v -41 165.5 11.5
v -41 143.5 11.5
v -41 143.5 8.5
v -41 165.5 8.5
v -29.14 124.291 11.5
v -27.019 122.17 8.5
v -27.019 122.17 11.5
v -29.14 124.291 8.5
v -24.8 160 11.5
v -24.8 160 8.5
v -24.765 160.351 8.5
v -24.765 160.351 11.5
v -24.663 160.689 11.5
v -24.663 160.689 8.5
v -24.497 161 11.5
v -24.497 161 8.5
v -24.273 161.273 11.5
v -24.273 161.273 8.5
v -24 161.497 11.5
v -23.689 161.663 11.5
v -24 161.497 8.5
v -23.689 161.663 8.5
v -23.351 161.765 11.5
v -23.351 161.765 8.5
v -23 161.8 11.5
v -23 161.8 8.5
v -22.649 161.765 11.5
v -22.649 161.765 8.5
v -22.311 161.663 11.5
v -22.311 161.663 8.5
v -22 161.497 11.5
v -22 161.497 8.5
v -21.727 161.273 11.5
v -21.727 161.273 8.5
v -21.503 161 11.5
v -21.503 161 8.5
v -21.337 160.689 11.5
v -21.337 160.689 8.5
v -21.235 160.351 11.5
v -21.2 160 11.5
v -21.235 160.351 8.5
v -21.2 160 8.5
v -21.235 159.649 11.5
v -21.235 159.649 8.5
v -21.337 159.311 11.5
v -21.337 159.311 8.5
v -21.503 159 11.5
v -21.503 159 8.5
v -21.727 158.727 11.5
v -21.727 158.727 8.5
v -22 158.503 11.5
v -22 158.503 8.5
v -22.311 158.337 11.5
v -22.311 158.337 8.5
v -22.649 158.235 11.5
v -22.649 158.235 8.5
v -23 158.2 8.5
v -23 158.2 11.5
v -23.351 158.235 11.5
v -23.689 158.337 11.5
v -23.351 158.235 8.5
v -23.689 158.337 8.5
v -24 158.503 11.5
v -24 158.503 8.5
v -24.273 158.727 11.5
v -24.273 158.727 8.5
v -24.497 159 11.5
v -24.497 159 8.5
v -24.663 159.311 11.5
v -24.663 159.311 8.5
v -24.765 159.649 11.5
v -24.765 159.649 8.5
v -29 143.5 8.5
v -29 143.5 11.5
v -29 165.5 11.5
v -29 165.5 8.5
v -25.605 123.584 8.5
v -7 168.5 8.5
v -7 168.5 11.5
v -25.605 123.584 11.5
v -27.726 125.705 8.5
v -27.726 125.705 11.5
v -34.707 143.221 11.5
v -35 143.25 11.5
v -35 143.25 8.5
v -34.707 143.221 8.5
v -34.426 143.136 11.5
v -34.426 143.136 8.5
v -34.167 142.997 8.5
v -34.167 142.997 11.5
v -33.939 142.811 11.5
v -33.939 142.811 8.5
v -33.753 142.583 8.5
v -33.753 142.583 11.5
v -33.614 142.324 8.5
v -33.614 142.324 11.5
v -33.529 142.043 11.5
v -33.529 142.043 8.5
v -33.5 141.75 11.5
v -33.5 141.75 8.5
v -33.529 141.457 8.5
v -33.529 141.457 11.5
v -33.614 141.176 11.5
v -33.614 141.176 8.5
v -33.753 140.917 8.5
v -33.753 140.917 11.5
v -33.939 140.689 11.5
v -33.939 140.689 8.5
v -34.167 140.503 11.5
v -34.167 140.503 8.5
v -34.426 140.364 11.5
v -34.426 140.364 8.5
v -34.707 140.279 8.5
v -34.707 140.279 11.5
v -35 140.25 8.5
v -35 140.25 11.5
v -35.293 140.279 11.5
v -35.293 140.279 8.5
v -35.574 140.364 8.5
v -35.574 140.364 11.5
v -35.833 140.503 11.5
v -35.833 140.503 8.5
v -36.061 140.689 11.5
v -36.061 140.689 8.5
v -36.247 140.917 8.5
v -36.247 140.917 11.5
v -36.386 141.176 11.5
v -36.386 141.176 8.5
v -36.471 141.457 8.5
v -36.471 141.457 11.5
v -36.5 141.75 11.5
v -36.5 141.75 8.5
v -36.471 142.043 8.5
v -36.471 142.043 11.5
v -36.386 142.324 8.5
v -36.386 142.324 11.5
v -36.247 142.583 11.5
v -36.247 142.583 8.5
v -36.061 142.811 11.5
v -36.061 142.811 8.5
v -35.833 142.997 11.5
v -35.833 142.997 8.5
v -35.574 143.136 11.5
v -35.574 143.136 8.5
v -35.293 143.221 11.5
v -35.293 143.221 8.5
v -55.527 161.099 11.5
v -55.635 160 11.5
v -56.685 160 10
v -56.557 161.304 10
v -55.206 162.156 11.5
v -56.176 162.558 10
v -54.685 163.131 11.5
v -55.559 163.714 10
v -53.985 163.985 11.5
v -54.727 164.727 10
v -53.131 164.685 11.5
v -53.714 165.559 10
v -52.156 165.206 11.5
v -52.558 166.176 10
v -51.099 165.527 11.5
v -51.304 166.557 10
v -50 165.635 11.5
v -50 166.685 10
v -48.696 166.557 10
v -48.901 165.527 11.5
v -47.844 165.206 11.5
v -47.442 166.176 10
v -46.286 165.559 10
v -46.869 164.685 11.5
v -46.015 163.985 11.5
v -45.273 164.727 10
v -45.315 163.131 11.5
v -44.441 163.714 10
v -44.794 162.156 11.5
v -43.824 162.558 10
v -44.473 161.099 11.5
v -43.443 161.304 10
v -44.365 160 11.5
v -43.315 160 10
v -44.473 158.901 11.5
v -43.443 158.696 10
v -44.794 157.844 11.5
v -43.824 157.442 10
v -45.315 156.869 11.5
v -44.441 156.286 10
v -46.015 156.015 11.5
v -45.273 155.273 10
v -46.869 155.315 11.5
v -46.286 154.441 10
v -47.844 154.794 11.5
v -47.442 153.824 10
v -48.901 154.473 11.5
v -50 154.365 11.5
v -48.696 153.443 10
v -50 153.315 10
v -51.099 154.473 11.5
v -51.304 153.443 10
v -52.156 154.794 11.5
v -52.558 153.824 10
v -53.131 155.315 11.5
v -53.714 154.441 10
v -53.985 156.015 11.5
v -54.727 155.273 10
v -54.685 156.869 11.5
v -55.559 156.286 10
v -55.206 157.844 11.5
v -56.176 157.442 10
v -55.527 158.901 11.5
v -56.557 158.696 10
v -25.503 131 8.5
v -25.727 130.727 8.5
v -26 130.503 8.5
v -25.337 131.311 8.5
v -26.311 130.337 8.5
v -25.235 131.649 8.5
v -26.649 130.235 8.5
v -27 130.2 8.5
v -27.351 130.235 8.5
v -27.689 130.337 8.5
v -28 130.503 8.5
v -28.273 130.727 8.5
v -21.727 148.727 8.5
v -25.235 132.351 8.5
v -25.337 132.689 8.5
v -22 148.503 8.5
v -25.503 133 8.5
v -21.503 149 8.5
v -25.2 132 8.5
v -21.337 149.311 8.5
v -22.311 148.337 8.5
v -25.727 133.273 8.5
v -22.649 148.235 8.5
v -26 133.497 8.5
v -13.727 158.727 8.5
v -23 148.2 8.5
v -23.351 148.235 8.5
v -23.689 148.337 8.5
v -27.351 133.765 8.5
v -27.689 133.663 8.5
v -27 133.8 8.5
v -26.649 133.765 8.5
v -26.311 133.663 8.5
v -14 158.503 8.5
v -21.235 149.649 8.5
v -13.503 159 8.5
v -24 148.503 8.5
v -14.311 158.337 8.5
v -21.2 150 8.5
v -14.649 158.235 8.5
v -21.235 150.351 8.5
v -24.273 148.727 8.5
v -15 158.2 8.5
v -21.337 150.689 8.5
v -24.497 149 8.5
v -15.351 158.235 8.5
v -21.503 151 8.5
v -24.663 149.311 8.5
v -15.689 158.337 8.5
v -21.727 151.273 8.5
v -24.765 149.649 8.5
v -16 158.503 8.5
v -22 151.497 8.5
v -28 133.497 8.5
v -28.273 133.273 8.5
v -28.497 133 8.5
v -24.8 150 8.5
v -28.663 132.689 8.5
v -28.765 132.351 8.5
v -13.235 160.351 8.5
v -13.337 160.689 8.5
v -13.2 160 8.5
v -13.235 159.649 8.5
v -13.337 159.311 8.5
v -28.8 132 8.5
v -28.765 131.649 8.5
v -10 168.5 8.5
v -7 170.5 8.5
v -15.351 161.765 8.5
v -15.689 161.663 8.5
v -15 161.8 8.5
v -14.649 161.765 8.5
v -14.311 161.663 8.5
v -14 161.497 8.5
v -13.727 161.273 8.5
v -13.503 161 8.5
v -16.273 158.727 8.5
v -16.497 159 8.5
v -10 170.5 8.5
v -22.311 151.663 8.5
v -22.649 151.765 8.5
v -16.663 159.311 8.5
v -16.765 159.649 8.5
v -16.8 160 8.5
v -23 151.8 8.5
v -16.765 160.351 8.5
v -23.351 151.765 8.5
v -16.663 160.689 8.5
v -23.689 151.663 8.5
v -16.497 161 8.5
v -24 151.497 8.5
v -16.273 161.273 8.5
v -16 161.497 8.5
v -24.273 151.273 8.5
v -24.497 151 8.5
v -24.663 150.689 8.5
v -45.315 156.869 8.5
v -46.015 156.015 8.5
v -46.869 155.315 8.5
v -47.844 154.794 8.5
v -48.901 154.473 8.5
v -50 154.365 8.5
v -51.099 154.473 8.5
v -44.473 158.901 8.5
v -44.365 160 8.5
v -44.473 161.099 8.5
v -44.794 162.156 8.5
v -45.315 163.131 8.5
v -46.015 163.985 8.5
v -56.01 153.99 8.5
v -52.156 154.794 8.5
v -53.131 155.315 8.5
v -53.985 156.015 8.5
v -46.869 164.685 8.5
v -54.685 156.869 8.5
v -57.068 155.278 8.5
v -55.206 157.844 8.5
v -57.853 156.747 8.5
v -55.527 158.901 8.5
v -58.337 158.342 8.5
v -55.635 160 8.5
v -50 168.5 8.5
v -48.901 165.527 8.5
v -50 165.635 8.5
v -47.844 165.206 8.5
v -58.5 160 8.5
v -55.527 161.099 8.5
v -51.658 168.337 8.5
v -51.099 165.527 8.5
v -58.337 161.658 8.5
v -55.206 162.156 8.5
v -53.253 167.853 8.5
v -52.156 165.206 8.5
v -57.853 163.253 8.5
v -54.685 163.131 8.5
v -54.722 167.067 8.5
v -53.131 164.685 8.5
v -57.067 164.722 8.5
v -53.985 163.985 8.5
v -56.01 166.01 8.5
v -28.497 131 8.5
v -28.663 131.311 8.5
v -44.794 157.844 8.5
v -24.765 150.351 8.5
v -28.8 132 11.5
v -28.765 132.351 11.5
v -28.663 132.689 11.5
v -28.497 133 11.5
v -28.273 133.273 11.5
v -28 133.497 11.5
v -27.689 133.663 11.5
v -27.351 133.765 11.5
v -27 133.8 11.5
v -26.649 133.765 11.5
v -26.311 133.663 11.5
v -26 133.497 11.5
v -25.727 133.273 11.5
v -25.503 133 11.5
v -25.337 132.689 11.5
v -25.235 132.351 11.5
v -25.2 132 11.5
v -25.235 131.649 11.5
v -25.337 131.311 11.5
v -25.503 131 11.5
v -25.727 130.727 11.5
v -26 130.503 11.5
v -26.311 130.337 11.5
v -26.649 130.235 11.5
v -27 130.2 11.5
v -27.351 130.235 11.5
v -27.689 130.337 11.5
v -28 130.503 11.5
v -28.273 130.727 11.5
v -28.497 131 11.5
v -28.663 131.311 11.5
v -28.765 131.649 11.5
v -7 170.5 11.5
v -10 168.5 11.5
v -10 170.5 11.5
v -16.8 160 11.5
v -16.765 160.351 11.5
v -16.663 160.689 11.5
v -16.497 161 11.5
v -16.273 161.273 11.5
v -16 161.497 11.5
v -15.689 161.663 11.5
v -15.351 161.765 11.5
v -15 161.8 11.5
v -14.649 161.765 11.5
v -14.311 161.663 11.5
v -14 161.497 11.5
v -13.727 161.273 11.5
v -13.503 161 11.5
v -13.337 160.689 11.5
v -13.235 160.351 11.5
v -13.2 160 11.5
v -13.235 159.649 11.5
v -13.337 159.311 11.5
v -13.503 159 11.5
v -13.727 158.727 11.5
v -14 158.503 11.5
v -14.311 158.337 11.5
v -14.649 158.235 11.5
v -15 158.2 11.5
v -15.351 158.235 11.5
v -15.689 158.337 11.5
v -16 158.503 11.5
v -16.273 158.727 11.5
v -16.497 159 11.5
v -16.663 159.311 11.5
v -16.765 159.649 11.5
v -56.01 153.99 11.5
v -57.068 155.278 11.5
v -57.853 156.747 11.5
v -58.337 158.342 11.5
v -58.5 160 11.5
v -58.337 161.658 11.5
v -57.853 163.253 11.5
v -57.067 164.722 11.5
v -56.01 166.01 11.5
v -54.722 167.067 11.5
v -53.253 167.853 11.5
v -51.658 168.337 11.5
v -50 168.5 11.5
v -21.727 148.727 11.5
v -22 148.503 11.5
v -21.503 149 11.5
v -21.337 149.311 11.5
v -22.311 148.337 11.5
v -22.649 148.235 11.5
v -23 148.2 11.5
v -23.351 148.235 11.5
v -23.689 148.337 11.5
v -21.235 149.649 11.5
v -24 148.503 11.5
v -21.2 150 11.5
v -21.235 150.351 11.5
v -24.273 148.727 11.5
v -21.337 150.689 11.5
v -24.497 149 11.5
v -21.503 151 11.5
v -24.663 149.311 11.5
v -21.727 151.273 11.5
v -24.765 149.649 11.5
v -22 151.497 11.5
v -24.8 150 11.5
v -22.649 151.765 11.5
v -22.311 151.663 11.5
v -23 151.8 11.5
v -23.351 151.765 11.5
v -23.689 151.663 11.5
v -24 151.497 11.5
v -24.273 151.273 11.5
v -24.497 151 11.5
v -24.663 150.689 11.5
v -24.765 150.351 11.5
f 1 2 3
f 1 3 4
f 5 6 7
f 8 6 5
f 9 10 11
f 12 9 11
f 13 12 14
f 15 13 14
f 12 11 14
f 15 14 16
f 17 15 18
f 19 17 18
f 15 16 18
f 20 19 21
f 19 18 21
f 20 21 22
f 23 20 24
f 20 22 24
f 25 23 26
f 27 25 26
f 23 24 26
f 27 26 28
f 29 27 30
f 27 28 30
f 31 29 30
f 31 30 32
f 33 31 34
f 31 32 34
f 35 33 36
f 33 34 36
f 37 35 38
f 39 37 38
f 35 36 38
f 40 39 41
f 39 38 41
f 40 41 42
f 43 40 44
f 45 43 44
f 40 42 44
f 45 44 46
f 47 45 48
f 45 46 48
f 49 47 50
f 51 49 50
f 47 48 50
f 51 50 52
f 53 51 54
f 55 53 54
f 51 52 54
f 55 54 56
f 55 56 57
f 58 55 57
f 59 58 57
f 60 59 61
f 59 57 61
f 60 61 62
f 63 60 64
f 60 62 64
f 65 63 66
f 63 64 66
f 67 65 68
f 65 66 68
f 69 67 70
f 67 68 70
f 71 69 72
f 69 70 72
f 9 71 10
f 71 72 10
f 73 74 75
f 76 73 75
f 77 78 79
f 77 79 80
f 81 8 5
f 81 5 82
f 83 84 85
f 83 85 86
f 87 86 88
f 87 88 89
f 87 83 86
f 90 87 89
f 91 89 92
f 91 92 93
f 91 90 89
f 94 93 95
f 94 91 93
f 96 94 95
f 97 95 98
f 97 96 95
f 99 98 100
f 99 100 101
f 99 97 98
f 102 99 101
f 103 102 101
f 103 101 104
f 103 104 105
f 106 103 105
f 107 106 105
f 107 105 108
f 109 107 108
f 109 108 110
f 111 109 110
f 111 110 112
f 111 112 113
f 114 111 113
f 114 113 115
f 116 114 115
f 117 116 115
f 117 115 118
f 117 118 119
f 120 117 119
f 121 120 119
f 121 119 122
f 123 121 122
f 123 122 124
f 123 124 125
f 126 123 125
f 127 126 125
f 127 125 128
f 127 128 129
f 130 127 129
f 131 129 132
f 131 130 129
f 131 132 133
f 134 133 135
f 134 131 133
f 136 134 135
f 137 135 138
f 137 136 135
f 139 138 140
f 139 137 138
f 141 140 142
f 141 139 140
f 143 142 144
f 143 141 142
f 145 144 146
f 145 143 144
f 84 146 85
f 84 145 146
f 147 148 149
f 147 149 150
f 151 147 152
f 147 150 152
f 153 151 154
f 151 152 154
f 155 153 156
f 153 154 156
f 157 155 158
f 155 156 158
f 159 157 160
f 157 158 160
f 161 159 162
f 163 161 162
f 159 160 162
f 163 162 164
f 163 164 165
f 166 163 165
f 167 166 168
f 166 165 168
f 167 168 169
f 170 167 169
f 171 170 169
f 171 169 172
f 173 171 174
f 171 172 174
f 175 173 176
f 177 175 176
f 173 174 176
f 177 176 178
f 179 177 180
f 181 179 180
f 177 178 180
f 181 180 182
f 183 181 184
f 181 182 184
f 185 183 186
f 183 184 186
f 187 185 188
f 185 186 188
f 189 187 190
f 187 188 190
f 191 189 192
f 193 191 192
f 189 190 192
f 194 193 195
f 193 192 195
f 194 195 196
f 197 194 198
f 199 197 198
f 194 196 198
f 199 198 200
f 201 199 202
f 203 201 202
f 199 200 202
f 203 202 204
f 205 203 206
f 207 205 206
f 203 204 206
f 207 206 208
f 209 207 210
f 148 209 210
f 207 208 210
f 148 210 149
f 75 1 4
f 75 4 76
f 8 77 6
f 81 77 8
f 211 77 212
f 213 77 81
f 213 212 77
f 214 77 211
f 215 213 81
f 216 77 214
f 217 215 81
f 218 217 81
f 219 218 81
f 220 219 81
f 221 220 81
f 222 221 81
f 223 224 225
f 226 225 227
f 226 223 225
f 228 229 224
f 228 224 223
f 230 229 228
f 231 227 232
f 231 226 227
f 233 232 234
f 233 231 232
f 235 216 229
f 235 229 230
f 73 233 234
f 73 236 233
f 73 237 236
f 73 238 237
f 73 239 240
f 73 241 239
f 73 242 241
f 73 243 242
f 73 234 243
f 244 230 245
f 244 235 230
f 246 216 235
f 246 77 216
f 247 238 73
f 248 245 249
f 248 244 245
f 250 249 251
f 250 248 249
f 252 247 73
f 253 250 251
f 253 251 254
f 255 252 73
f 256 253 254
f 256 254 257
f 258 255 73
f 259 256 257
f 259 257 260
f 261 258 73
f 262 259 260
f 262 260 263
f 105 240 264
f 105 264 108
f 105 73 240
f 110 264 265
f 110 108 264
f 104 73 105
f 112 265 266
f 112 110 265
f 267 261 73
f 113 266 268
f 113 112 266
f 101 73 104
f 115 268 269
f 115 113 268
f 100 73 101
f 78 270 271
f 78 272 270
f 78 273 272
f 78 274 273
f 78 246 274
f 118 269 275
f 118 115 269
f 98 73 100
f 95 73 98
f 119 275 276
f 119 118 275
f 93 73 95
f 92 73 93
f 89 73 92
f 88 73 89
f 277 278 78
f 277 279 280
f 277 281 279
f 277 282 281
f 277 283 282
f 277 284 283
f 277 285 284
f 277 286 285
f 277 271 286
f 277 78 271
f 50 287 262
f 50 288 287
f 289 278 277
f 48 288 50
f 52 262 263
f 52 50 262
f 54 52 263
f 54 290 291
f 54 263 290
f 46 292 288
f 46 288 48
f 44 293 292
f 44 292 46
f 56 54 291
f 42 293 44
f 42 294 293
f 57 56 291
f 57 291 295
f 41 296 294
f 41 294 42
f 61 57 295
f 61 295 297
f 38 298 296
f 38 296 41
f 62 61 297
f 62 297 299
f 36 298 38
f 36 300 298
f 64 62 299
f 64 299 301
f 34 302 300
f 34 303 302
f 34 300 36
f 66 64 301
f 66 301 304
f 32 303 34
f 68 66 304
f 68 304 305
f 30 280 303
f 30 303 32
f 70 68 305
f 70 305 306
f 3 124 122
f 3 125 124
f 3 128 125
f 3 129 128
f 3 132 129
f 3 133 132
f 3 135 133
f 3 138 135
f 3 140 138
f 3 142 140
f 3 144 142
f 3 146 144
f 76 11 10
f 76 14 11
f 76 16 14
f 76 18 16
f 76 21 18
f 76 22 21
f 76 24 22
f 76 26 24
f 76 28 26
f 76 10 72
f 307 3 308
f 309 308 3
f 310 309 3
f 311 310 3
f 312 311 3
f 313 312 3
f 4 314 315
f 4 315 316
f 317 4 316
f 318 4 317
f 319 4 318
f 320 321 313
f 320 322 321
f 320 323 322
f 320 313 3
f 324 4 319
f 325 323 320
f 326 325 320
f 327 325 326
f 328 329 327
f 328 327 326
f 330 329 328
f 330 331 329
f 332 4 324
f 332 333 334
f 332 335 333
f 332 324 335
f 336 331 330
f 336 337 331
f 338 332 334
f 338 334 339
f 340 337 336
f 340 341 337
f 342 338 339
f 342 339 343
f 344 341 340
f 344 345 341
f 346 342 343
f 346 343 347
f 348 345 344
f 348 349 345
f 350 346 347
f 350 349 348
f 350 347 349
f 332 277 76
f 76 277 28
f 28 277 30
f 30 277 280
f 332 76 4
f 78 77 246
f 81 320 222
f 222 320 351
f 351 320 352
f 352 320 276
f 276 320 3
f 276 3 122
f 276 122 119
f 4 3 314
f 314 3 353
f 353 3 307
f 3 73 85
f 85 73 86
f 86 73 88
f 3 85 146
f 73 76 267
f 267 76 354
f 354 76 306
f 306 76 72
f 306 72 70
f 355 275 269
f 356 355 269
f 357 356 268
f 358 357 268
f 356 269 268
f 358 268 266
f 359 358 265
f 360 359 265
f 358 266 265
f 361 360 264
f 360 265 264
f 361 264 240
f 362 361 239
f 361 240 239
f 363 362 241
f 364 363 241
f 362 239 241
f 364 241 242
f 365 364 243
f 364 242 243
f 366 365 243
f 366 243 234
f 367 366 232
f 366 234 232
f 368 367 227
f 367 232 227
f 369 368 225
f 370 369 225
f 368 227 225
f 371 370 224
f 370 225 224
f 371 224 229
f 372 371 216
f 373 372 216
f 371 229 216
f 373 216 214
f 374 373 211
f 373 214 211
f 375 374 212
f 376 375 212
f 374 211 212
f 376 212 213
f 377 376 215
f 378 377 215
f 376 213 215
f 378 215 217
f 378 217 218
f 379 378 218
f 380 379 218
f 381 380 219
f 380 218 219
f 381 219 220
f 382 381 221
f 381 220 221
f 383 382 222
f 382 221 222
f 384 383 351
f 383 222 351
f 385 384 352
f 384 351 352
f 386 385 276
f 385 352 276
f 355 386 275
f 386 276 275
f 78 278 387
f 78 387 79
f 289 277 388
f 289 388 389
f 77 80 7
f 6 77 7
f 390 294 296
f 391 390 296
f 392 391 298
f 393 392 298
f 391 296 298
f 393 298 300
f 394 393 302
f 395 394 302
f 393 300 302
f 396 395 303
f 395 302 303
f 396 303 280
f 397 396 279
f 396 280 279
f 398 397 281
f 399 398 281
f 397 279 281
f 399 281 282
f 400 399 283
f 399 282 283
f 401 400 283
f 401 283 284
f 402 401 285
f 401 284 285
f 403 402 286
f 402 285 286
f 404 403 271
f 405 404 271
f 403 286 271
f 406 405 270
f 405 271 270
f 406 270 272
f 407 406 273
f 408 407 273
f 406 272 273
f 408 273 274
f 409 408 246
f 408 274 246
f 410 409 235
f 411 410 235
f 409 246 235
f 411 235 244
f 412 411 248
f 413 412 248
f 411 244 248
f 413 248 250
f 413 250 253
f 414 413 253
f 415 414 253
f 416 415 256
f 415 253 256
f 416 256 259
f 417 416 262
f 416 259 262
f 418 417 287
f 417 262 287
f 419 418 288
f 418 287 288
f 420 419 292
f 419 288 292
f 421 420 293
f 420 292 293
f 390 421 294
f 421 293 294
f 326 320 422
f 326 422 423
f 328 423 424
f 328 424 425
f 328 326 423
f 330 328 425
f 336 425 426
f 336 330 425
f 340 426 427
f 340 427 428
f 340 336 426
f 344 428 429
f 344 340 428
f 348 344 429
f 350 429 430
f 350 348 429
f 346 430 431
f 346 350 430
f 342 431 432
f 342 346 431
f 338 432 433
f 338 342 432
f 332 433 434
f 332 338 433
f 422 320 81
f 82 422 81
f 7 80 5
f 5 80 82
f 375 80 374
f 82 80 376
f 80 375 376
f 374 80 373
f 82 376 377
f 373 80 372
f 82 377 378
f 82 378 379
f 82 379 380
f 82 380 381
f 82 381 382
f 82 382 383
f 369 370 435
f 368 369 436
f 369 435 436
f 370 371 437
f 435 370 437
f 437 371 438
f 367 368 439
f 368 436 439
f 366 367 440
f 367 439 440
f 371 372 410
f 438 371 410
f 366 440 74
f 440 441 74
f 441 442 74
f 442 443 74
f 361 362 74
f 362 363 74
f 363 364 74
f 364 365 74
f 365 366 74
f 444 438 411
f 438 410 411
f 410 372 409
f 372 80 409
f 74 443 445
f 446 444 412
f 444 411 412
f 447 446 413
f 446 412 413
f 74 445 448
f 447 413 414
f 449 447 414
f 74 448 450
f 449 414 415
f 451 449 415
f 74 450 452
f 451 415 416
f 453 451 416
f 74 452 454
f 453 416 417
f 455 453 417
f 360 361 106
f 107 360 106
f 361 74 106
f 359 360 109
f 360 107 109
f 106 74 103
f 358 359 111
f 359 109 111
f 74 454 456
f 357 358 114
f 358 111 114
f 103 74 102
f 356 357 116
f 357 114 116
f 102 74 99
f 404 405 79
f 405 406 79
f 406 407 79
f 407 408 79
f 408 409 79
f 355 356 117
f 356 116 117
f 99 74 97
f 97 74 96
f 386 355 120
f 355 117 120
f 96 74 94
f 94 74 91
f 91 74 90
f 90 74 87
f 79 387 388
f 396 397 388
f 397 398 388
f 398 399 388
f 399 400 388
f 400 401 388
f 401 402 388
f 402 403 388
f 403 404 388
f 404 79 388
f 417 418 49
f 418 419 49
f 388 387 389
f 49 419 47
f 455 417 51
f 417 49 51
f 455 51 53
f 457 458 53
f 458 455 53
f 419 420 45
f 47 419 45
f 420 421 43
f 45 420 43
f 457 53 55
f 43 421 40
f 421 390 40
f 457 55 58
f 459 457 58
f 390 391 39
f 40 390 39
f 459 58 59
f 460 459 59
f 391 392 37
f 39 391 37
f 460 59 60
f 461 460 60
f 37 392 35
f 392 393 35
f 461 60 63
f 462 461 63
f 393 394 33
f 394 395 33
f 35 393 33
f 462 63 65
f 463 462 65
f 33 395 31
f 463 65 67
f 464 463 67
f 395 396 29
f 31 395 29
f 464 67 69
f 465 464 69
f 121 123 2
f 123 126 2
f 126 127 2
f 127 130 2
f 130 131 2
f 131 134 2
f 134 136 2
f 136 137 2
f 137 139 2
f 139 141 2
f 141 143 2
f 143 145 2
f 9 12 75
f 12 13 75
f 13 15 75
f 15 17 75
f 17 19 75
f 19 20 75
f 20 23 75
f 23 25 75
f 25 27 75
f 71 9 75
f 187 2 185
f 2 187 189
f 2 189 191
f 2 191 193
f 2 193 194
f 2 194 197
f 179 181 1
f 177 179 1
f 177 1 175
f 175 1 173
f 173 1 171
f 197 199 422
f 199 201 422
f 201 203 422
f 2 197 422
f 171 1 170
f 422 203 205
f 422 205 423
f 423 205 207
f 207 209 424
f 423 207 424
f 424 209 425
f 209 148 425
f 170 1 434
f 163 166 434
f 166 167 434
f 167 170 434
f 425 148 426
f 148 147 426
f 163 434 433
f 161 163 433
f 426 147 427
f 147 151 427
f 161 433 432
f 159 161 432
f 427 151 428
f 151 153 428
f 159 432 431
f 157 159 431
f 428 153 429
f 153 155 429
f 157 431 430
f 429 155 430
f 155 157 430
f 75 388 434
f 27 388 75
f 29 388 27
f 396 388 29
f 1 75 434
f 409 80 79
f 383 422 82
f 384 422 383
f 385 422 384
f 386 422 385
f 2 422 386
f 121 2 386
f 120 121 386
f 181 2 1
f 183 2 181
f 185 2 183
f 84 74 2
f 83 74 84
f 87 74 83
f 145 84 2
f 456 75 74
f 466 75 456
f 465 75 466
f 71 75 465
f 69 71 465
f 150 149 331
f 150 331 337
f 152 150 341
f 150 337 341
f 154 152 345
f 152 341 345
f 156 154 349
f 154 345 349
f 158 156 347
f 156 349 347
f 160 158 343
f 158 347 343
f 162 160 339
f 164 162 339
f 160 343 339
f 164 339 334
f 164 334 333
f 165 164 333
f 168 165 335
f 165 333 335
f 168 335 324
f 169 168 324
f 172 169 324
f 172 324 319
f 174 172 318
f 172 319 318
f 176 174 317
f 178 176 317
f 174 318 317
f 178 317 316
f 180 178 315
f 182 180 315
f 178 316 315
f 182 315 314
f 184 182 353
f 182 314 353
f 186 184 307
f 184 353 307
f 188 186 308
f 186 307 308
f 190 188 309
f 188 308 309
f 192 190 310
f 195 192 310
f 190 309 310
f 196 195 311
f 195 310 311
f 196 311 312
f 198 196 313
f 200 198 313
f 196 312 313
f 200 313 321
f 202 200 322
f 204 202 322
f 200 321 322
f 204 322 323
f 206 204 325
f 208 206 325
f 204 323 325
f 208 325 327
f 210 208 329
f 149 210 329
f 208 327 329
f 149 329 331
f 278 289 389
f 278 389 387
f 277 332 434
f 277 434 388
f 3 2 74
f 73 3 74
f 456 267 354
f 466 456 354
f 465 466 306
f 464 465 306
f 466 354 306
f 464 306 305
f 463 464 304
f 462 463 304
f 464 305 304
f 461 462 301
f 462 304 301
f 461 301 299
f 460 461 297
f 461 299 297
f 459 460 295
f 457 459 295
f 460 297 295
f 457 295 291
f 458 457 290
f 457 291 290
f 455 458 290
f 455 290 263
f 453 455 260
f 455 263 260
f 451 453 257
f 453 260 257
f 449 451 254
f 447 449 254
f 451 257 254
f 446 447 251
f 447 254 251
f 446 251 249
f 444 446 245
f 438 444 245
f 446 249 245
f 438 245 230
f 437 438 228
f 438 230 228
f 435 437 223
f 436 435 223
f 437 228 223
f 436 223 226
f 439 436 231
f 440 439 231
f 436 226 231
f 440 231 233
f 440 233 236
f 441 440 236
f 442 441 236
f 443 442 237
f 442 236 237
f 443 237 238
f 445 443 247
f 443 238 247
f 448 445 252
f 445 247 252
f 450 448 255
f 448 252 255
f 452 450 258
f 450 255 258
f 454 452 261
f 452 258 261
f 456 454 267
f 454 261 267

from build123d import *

# Parameters (mm, degrees)
SKETCH182_R     = 1.5
SKETCH182_W     = 22
SKETCH182_H     = 12
PAD127029_DEPTH = 17.5
SKETCH153_R     = 8
SKETCH153_R_2   = 1.8
PAD119_DEPTH    = 3


with BuildPart() as pad127029:
    # Sketch182 → Pad127029 (new body, symmetric)
    with BuildSketch(Plane(origin=(35, 160, 12), x_dir=(0, 1, 0), z_dir=(0, 0, 1))):
        with Locations((-18.25, 0)):
            Circle(SKETCH182_R)
        with Locations((-5.5, 0)):
            Rectangle(SKETCH182_W, SKETCH182_H)
    extrude(amount=PAD127029_DEPTH, both=True)


with BuildPart() as frontwheelbaseplate:
    # Sketch153 → Pad119 (new body)
    with BuildSketch(Plane(origin=(50, 160, 8.5), x_dir=(1, 0, 0), z_dir=(0, 0, 1))):
        with BuildLine():
            ThreePointArc((6.010433, -6.010382), (7.852969, 3.252826), (0, 8.5))
            Line((0, 8.5), (-40, 8.5))
            Line((-40, 8.5), (-40, 10.5))
            Line((-40, 10.5), (-43, 10.5))
            Line((-43, 10.5), (-43, 8.5))
            Line((-43, 8.5), (-24.395158, -36.415973))
            Line((-24.395158, -36.415973), (-22.980945, -37.830187))
            Line((-22.980945, -37.830187), (-20.859624, -35.708867))
            Line((-20.859624, -35.708867), (-22.273838, -34.294653))
            Line((6.010433, -6.010382), (-22.273838, -34.294653))
        make_face()
        Circle(SKETCH153_R, mode=Mode.SUBTRACT)
        with Locations((-27, 0)):
            Circle(SKETCH153_R_2, mode=Mode.SUBTRACT)
        with Locations((-27, -10)):
            Circle(SKETCH153_R_2, mode=Mode.SUBTRACT)
        with Locations((-23, -28)):
            Circle(SKETCH153_R_2, mode=Mode.SUBTRACT)
        with Locations((-35, 0)):
            Circle(SKETCH153_R_2, mode=Mode.SUBTRACT)
    extrude(amount=PAD119_DEPTH)


with BuildPart() as steeringbaseplate:
    # Sketch151 → Revolution007 (revolve)
    with BuildSketch(Plane(origin=(50, 160, 10), x_dir=(1, 0, 0), z_dir=(0, -1, 0))):
        Polygon((5.634953, 1.5), (6.685264, 0), (5.634953, -1.5), (8, -1.5), (8, 1.5), align=None)
    revolve(axis=Axis((50, 160, 10), (0, 0, 1)))

    # Fusion004020020: union FrontWheelBasePlate
    add(frontwheelbaseplate.part)

    # Cut007019020: cut Pad127029
    add(pad127029.part, mode=Mode.SUBTRACT)


with BuildPart() as part_mirroring011:
    # Part__Mirroring011: instance of SteeringBasePlate
    add(steeringbaseplate.part.mirror(Plane(origin=(0, 0, 0), x_dir=(0, -1, 0), z_dir=(1, 0, 0))))


solid = part_mirroring011.part
